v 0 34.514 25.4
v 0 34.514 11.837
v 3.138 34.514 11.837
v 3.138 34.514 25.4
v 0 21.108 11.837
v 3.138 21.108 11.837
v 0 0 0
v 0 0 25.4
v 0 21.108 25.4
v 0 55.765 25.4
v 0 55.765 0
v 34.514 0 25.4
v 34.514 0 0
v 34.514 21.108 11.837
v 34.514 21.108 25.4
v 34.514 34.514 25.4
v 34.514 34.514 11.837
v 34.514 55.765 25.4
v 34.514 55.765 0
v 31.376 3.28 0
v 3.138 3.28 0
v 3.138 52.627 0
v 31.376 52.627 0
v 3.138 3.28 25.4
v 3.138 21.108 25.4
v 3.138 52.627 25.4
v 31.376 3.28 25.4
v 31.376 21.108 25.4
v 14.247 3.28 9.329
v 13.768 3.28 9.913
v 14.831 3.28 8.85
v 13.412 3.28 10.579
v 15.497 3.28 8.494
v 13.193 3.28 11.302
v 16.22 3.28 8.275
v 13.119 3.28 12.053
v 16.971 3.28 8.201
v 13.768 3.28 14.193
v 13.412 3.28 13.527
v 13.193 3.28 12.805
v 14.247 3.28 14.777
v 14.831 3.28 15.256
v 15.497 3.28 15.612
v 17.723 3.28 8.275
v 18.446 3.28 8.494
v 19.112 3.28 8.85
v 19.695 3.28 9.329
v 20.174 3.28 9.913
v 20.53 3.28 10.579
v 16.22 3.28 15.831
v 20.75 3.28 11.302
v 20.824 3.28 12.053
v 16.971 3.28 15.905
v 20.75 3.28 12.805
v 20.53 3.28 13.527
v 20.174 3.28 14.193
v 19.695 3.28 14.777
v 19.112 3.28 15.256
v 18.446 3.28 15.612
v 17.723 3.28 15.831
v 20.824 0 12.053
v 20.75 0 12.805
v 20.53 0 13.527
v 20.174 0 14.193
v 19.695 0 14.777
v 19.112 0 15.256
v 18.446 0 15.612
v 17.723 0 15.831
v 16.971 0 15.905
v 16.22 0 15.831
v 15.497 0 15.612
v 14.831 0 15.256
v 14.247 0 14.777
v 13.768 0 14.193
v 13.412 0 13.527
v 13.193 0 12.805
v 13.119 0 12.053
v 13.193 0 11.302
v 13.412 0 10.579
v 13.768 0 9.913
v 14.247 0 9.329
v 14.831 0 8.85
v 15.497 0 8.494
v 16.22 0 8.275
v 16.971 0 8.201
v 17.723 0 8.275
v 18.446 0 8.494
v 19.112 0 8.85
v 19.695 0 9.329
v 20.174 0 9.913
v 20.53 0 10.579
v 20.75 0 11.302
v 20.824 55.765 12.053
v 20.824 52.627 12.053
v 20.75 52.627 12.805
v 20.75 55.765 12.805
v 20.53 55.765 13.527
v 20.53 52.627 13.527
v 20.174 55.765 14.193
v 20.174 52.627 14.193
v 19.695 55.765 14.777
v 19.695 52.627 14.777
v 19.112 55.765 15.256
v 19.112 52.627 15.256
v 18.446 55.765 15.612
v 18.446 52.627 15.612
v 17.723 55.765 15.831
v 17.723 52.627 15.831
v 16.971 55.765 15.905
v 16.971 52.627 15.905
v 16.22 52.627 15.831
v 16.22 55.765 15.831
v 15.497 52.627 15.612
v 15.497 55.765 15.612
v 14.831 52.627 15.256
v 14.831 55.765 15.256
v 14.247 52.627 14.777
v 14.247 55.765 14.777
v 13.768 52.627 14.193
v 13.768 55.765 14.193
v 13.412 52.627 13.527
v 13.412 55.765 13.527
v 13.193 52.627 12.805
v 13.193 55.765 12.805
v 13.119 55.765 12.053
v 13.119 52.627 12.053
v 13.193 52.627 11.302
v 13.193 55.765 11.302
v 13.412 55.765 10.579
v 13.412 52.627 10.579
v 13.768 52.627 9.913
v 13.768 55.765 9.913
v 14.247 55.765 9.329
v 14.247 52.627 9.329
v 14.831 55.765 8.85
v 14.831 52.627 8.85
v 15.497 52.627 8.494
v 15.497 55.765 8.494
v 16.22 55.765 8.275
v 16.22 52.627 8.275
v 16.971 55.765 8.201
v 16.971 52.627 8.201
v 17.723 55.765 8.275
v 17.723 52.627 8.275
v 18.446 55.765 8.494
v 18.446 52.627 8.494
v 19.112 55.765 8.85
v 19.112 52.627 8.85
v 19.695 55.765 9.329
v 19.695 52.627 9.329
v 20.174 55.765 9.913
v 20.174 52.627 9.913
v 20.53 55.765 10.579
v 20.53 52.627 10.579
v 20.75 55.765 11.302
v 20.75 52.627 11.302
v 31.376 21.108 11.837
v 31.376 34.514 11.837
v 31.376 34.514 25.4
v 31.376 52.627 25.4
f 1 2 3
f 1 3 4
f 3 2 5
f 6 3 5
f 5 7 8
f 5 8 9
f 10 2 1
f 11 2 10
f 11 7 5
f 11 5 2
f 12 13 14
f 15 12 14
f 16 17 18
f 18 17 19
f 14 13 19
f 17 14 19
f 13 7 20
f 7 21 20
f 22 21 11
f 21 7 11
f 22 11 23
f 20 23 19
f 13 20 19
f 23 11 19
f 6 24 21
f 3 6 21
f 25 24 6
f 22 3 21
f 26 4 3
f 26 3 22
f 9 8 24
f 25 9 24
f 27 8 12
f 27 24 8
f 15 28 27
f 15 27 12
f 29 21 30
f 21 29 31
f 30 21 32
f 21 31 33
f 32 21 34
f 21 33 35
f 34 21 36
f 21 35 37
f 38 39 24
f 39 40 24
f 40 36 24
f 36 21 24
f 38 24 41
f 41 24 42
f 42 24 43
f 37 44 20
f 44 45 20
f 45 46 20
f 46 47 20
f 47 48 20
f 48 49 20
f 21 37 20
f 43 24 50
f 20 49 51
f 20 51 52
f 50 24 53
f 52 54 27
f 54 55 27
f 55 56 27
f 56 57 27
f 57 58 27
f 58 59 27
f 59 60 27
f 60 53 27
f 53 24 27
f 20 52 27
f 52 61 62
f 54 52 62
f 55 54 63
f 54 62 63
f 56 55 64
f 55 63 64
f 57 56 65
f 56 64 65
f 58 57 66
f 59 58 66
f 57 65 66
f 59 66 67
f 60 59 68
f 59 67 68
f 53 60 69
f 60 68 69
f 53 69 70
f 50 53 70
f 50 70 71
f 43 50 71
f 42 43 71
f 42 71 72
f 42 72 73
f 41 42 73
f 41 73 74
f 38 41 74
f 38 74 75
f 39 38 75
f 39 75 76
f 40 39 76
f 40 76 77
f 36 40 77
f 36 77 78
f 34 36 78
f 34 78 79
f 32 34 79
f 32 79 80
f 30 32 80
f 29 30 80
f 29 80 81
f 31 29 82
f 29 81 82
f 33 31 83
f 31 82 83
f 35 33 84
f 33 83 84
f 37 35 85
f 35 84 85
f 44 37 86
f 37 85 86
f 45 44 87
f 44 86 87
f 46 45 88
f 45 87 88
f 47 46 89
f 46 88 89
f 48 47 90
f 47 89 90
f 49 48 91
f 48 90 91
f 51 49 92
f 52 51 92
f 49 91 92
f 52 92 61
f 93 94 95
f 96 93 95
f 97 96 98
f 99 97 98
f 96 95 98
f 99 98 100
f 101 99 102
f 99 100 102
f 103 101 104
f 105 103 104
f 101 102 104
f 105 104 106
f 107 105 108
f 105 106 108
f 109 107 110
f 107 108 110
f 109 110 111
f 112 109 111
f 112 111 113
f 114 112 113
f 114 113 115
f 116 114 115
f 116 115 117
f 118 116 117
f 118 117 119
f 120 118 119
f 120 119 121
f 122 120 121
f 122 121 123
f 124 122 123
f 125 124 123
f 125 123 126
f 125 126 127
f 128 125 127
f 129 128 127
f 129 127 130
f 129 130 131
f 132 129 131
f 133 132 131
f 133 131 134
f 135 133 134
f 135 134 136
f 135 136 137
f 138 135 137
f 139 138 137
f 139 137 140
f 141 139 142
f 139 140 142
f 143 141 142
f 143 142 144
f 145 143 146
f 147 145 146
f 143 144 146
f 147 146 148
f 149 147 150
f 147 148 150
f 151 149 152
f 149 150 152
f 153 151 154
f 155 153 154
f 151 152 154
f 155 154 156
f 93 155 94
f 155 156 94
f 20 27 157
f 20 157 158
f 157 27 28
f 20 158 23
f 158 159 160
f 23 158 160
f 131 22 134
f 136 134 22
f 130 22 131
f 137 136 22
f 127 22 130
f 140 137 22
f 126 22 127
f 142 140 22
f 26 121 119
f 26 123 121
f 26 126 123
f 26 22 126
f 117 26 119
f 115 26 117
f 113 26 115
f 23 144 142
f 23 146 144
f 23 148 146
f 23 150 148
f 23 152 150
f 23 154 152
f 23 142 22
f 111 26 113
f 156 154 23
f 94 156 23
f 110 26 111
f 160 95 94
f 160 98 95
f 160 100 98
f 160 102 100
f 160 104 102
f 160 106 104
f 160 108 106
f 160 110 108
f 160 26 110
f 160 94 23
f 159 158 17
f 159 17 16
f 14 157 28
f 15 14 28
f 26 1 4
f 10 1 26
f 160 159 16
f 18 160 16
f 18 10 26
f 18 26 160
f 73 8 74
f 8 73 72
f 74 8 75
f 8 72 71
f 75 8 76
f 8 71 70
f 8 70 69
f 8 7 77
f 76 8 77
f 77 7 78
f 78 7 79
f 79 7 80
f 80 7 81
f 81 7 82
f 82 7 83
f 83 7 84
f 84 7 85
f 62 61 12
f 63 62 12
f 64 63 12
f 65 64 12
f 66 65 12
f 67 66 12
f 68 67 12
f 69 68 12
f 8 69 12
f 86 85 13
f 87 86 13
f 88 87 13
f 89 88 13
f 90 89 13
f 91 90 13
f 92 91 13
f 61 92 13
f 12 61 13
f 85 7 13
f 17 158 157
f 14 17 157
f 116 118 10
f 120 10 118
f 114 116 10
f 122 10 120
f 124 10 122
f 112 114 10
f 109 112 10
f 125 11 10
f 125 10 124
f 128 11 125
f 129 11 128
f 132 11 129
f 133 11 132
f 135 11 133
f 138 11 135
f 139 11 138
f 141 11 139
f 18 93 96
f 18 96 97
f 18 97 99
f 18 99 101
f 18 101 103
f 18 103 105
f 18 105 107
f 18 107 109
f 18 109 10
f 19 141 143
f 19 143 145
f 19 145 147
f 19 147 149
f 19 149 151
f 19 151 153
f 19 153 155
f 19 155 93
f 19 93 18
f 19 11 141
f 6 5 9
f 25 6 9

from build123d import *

# Parameters (mm, degrees)
F0_W     = 34.514117986
F0_H     = 55.7645447552
F1_DEPTH = 25.4
F2_R     = 3.8523335732
F3_DEPTH = 55.7655447552
F4_W     = 28.238822706
F4_H     = 49.3466292974
F5_DEPTH = 25.401
F6_W     = 13.4063102305
F6_H     = 13.5625138223
F7_DEPTH = 34.515117986


with BuildPart() as f1:
    # F0 (on Top) → F1 (new body)
    with BuildSketch(Plane.XY):
        with Locations((17.257058993, 27.8822723776)):
            Rectangle(F0_W, F0_H)
    extrude(amount=F1_DEPTH)

    # F2 (on face) → F3 (cut, through all)
    with BuildSketch(Plane.XZ):
        with Locations((16.971334815, 12.0531069115)):
            Circle(F2_R)
    extrude(amount=-F3_DEPTH, mode=Mode.SUBTRACT)

    # F4 (on face) → F5 (cut, through all)
    with BuildSketch(Plane.XY.offset(25.4)):
        with Locations((17.2570585273, 27.9535820009)):
            Rectangle(F4_W, F4_H)
    extrude(amount=-F5_DEPTH, mode=Mode.SUBTRACT)

    # F6 (on face) → F7 (cut, through all)
    with BuildSketch(Plane(origin=(0, 0, 0), x_dir=(0, -1, 0), z_dir=(-1, 0, 0))):
        with Locations((-27.8109628707, 18.6187430888)):
            Rectangle(F6_W, F6_H)
    extrude(amount=-F7_DEPTH, mode=Mode.SUBTRACT)


solid = f1.part
